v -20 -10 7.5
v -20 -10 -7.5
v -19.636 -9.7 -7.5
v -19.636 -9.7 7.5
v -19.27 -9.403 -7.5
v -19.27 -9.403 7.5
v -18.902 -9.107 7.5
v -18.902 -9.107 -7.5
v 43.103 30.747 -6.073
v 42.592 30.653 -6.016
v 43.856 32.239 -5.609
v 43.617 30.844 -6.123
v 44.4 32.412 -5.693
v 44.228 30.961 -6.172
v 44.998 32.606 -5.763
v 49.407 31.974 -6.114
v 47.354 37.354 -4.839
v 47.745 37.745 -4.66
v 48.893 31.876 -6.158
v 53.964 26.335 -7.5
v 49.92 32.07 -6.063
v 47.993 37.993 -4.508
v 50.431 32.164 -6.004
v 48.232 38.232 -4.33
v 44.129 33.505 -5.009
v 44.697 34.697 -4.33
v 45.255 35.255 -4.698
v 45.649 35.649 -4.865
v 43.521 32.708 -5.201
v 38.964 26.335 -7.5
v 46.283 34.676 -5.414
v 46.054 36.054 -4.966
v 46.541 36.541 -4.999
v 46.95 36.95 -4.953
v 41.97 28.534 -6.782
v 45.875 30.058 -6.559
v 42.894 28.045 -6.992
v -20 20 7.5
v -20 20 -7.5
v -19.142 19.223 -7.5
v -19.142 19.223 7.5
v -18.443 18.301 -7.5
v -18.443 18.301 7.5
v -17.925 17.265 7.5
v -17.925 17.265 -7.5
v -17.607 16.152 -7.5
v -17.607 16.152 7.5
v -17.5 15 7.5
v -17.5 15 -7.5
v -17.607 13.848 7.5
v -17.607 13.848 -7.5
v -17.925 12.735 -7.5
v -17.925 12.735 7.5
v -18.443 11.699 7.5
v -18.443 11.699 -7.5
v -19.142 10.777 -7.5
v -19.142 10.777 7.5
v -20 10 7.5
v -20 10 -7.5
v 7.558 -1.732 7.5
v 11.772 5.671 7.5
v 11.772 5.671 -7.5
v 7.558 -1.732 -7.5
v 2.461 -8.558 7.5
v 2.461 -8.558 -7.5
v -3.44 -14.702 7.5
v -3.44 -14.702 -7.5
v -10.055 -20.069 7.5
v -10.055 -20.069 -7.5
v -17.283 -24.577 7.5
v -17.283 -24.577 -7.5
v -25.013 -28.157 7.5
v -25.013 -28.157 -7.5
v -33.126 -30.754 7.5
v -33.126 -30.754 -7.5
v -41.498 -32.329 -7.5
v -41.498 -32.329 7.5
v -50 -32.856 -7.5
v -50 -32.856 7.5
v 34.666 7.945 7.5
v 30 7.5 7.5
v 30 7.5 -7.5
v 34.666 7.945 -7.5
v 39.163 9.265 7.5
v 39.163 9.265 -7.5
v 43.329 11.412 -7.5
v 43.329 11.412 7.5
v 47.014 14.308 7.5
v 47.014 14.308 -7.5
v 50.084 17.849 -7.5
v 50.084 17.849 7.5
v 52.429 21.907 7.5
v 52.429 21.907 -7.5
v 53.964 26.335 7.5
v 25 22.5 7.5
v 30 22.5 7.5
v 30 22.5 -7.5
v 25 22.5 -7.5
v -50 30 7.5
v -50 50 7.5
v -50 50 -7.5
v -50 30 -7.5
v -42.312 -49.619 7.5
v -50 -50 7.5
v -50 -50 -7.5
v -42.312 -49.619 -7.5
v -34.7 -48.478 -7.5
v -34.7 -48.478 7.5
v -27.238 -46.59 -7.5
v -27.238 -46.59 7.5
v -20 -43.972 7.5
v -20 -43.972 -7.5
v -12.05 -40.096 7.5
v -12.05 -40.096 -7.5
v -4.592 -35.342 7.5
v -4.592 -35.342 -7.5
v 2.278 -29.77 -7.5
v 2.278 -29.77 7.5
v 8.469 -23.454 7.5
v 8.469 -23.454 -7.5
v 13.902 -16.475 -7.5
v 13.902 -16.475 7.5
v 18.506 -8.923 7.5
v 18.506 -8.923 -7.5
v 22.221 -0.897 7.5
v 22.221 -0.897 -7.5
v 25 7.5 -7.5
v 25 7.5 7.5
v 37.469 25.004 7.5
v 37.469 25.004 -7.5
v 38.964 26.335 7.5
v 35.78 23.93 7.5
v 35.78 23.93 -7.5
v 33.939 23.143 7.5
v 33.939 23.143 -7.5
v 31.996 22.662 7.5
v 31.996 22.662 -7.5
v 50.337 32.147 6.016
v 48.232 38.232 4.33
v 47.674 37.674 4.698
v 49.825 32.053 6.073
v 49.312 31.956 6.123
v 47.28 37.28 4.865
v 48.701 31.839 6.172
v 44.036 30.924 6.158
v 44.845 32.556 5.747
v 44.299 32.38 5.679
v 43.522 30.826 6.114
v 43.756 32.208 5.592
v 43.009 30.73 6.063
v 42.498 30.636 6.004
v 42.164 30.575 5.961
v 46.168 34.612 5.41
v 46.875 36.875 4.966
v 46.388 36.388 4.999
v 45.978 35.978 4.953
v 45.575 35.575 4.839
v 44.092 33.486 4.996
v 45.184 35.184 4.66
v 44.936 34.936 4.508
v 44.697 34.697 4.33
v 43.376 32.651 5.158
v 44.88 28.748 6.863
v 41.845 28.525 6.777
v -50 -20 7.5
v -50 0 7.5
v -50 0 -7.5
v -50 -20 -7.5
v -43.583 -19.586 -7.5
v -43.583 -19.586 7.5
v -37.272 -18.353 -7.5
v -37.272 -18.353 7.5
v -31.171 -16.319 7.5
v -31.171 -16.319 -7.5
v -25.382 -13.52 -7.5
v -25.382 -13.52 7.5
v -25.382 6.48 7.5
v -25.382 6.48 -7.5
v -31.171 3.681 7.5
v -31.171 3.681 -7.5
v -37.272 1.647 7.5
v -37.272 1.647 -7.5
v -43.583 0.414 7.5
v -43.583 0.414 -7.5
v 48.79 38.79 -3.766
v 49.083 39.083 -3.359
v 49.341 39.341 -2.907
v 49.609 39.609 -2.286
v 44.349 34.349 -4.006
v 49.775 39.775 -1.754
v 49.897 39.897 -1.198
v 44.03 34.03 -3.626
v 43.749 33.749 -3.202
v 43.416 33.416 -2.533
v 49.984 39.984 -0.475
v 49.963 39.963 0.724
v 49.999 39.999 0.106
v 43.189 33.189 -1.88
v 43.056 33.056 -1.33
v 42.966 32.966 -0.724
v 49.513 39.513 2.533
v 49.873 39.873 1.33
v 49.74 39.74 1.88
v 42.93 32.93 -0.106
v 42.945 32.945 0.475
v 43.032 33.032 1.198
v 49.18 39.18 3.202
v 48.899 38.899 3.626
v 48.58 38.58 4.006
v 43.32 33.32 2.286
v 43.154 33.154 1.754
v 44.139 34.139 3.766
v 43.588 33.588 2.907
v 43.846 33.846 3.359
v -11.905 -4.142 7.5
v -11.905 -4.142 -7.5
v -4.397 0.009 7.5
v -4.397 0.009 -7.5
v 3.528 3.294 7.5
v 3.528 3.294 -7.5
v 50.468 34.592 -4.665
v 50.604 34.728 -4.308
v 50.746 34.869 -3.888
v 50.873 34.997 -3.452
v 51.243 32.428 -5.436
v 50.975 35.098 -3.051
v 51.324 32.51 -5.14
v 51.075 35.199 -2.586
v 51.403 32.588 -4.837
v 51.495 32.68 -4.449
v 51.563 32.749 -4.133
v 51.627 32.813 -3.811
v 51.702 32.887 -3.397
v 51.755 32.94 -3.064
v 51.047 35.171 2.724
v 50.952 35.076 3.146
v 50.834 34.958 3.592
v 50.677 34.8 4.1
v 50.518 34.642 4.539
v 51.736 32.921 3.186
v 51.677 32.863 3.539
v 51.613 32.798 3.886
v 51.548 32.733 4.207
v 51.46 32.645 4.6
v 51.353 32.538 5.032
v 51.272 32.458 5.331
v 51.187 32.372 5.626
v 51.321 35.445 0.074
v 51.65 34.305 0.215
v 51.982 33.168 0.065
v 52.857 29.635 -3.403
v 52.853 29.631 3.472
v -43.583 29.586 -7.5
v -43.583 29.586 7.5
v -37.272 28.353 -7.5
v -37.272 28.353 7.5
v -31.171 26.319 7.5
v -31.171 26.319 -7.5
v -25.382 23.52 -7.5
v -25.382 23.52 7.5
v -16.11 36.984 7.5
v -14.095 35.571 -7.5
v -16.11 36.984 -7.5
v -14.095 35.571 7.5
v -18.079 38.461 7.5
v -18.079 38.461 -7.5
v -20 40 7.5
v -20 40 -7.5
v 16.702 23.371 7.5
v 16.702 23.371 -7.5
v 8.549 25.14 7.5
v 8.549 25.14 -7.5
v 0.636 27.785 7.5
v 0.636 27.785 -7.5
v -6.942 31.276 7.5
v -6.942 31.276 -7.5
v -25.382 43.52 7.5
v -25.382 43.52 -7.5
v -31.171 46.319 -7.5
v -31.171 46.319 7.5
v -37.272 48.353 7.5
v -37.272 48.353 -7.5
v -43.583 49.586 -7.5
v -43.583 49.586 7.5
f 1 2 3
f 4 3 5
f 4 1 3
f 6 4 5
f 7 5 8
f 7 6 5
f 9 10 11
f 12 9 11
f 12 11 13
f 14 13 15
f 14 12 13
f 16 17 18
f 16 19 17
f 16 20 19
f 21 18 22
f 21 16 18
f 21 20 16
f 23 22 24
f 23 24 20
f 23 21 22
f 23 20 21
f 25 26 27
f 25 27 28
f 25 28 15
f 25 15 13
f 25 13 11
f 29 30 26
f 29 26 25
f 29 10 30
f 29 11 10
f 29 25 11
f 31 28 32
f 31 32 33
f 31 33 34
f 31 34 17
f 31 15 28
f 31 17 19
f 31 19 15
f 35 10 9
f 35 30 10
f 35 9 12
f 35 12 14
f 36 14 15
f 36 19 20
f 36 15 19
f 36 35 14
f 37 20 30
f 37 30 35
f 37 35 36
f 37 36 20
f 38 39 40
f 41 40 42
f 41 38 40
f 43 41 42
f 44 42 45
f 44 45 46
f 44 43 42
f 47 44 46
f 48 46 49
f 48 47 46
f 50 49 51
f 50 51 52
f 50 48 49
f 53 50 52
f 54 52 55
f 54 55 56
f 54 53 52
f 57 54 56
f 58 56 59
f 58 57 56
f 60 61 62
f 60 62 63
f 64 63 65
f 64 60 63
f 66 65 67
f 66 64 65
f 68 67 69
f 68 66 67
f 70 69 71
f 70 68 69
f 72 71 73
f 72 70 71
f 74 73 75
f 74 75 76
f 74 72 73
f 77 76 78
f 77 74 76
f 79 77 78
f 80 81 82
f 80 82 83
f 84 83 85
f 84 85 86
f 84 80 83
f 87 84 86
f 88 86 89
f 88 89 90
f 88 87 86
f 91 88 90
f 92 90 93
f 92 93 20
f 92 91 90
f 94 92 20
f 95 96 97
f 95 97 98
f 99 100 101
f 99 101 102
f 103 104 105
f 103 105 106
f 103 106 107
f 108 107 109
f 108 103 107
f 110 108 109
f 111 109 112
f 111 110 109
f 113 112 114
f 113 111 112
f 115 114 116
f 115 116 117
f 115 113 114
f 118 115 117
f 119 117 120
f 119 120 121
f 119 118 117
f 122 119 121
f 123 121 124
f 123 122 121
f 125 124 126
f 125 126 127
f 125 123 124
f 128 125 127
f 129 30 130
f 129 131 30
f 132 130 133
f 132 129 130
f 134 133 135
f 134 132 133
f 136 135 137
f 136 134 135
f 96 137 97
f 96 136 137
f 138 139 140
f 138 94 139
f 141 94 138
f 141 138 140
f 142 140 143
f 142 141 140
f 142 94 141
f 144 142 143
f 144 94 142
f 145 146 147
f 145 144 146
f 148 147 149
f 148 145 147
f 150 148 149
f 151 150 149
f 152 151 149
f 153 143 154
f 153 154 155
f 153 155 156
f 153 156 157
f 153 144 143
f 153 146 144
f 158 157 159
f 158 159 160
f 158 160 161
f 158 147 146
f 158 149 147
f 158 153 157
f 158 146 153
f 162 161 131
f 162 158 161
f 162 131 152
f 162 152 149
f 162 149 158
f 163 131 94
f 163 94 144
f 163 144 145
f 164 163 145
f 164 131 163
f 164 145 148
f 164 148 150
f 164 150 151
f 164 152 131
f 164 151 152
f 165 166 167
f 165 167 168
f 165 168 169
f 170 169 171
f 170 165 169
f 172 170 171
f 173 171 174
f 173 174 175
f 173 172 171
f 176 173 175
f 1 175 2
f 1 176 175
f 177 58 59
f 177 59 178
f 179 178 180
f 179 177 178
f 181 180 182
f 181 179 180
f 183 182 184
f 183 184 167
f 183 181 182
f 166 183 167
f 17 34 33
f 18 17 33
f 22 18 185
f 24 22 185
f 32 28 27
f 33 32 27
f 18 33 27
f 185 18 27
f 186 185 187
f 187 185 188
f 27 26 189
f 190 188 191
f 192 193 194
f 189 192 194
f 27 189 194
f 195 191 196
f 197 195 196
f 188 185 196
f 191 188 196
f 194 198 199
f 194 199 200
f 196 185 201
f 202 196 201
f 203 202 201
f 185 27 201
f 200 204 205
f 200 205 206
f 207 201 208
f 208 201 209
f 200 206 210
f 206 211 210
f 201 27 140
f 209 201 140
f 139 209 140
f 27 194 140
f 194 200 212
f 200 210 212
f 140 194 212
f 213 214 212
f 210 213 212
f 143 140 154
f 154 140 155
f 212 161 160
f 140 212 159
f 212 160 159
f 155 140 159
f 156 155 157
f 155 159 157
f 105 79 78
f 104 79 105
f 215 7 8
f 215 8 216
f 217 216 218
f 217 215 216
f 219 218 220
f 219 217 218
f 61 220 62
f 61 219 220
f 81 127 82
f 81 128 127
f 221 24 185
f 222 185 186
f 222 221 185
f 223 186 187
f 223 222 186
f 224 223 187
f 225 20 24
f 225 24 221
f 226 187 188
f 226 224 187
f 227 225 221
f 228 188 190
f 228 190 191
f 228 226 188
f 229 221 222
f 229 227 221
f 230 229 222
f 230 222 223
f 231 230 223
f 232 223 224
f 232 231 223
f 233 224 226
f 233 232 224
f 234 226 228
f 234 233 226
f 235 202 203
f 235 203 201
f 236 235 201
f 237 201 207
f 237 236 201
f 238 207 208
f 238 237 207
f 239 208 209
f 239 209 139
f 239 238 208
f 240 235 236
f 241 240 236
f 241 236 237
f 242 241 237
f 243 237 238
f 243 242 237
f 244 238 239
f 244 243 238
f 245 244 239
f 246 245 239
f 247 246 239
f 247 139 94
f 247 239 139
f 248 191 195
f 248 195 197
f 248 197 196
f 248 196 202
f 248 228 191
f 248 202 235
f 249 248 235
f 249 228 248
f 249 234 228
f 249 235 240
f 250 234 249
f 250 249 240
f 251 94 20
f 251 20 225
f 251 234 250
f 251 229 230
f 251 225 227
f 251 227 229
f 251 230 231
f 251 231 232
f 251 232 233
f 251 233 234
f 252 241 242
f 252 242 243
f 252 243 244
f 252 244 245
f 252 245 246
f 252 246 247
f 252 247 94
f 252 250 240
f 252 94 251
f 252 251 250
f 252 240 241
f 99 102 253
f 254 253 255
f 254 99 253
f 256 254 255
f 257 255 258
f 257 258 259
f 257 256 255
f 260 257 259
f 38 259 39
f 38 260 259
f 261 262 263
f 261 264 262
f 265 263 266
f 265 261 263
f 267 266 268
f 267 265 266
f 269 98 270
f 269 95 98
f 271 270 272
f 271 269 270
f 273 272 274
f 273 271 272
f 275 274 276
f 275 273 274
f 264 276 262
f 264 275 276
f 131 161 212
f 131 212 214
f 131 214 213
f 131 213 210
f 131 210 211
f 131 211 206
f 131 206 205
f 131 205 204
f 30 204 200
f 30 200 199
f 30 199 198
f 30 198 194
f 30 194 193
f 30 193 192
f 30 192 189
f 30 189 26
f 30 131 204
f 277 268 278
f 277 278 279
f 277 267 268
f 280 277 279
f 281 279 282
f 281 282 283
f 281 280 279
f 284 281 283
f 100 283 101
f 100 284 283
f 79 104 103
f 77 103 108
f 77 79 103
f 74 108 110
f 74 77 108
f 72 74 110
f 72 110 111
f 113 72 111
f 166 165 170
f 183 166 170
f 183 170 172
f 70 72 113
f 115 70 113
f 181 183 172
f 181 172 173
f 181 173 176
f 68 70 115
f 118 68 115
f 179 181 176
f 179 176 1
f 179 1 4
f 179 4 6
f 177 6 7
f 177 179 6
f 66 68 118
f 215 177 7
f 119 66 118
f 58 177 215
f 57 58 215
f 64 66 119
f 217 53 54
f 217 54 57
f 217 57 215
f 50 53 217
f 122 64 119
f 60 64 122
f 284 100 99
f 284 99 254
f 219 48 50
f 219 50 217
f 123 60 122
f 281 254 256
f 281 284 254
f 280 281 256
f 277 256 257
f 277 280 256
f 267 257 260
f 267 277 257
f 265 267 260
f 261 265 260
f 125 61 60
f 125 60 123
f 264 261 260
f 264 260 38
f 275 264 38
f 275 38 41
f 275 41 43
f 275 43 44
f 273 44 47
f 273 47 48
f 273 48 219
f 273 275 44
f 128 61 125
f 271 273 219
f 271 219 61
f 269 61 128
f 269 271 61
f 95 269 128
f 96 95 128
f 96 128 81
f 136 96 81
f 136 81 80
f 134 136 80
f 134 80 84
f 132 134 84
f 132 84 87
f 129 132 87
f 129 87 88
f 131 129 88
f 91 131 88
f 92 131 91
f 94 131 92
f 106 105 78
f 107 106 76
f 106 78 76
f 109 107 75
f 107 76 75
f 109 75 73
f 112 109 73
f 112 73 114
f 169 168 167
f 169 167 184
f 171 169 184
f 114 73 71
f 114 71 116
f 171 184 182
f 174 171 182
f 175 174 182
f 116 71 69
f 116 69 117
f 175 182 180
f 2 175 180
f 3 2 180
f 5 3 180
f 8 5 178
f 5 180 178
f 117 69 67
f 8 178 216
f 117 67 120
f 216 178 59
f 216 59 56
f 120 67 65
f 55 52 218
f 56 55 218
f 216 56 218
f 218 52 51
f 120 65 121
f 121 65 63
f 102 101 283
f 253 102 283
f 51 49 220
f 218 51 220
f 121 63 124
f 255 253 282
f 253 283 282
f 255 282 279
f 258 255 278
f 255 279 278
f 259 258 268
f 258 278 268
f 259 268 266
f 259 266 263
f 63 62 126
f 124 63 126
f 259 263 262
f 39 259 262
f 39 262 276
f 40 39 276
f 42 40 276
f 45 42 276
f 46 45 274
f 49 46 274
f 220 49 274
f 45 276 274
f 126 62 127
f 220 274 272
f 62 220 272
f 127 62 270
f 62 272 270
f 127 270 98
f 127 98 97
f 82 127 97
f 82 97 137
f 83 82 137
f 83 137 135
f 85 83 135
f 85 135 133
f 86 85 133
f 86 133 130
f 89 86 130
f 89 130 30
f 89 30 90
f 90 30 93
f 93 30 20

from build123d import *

# Parameters (mm, degrees)
F17_DEPTH = 7.5
F19_DEPTH = 7.5
F20_DEPTH = 7.5


# Not quite as in the source:
# - the arcs of a loft's sections are written as splines that run evenly, so that the points pair up as in the source's solid


with BuildPart() as f9:
    # F2 (on face) → F9 section 0
    with BuildSketch(Plane(origin=(5, -5, 0), x_dir=(0.7071067812, 0.7071067812, 0), z_dir=(0.7071067812, -0.7071067812, 0))):
        with BuildLine():
            add(Edge.make_bspline(
                [(53.6396103068, 0), (53.6396103068, -0.5817764173), (53.7421679492, -1.1634097103), (54.1401264565, -2.2567917229), (54.4354294185, -2.7682714568), (55.1833467639, -3.6596046401), (55.6357771501, -4.0392388103), (56.1396103068, -4.3301270189)],
                knots=[0, 0, 0, 0, 0.3333333333, 0.3333333333, 0.6666666667, 0.6666666667, 1, 1, 1, 1], degree=3))
            add(Edge.make_bspline(
                [(56.1396103068, -4.3301270189), (56.6434434635, -4.6210152276), (57.1984314921, -4.8230143504), (58.3443073448, -5.0250631797), (58.9349132688, -5.0250631797), (60.0807891214, -4.8230143504), (60.6357771501, -4.6210152276), (61.1396103068, -4.3301270189)],
                knots=[0, 0, 0, 0, 0.3333333333, 0.3333333333, 0.6666666667, 0.6666666667, 1, 1, 1, 1], degree=3))
            add(Edge.make_bspline(
                [(61.1396103068, -4.3301270189), (61.6434434635, -4.0392388103), (62.0958738497, -3.6596046401), (62.8437911951, -2.7682714568), (63.1390941571, -2.2567917229), (63.5370526644, -1.1634097103), (63.6396103068, -0.5817764173), (63.6396103068, 0)],
                knots=[0, 0, 0, 0, 0.3333333333, 0.3333333333, 0.6666666667, 0.6666666667, 1, 1, 1, 1], degree=3))
            add(Edge.make_bspline(
                [(63.6396103068, 0), (63.6396103068, 0.5817764173), (63.5370526644, 1.1634097103), (63.1390941571, 2.2567917229), (62.8437911951, 2.7682714568), (62.0958738497, 3.6596046401), (61.6434434635, 4.0392388103), (61.1396103068, 4.3301270189)],
                knots=[0, 0, 0, 0, 0.3333333333, 0.3333333333, 0.6666666667, 0.6666666667, 1, 1, 1, 1], degree=3))
            add(Edge.make_bspline(
                [(61.1396103068, 4.3301270189), (60.6357771501, 4.6210152276), (60.0807891214, 4.8230143504), (58.9349132688, 5.0250631797), (58.3443073448, 5.0250631797), (57.1984314921, 4.8230143504), (56.6434434635, 4.6210152276), (56.1396103068, 4.3301270189)],
                knots=[0, 0, 0, 0, 0.3333333333, 0.3333333333, 0.6666666667, 0.6666666667, 1, 1, 1, 1], degree=3))
            add(Edge.make_bspline(
                [(56.1396103068, 4.3301270189), (55.6357771501, 4.0392388103), (55.1833467639, 3.6596046401), (54.4354294185, 2.7682714568), (54.1401264565, 2.2567917229), (53.7421679492, 1.1634097103), (53.6396103068, 0.5817764173), (53.6396103068, 0)],
                knots=[0, 0, 0, 0, 0.3333333333, 0.3333333333, 0.6666666667, 0.6666666667, 1, 1, 1, 1], degree=3))
        make_face()
    # F8 (on plane+point) → F9 section 1
    with BuildSketch(Plane.XZ.offset(-26.335299015)):
        Polygon((38.9644660941, 7.5), (38.9644660941, 0), (38.9644660941, -7.5), (53.9644660941, -7.5), (53.9644660941, 0), (53.9644660941, 7.5), align=None)
    loft(ruled=True)

    # F16 (on plane+point) → F17 (join, symmetric)
    with BuildSketch(Plane.XY):
        with BuildLine():
            ThreePointArc((38.9644660941, 26.335299015), (34.8752223254, 23.4990929499), (30, 22.5))
            Line((30, 22.5), (30, 7.5))
            ThreePointArc((30, 7.5), (45.2402766064, 12.7723861725), (53.9644660941, 26.335299015))
            Line((53.9644660941, 26.335299015), (38.9644660941, 26.335299015))
        make_face()
    extrude(amount=F17_DEPTH, both=True)

    # F18 (on Top) → F19 (join, symmetric)
    with BuildSketch(Plane.XY):
        Polygon((30, 7.5), (30, 22.5), (25, 22.5), (25, 15), (25, 7.5), align=None)
    extrude(amount=F19_DEPTH, both=True)

    # F18 (on Top) → F20 (join, symmetric)
    with BuildSketch(Plane.XY):
        with BuildLine():
            Line((-50, 40), (-20, 40))
            ThreePointArc((-20, 40), (-34.1886116992, 47.4341649025), (-50, 50))
            Line((-50, 50), (-50, 40))
        make_face()
        with BuildLine():
            Line((25, 15), (25, 22.5))
            ThreePointArc((25, 22.5), (4.5562384252, 26.3545057073), (-14.0947561264, 35.5710670948))
            ThreePointArc((-14.0947561264, 35.5710670948), (-17.1007926042, 37.7143141594), (-20, 40))
            Line((-20, 40), (-50, 40))
            Line((-50, 40), (-50, 30))
            ThreePointArc((-50, 30), (-34.1886116992, 27.4341649025), (-20, 20))
            ThreePointArc((-20, 20), (-18.1598300563, 17.7950849719), (-17.5, 15))
            Line((-17.5, 15), (10, 15))
            Line((10, 15), (25, 15))
        make_face()
        with BuildLine():
            ThreePointArc((-20, -43.971782705), (8.4686762609, -23.4540986425), (25, 7.5))
            ThreePointArc((25, 7.5), (18.3458720417, 6.87456335), (11.7716580953, 5.6711096222))
            ThreePointArc((11.7716580953, 5.6711096222), (-13.5991721952, -22.4348243888), (-50, -32.8560667038))
            Line((-50, -32.8560667038), (-50, -42.8560667038))
            Line((-50, -42.8560667038), (-50, -50))
            ThreePointArc((-50, -50), (-34.7001682709, -48.4780326329), (-20, -43.971782705))
        make_face()
        with BuildLine():
            Line((25, 7.5), (25, 15))
            Line((25, 15), (10, 15))
            Line((10, 15), (11.7716580953, 5.6711096222))
            ThreePointArc((11.7716580953, 5.6711096222), (18.3458720417, 6.87456335), (25, 7.5))
        make_face()
        with BuildLine():
            Line((11.7716580953, 5.6711096222), (10, 15))
            Line((10, 15), (-17.5, 15))
            ThreePointArc((-17.5, 15), (-18.1598300563, 12.2049150281), (-20, 10))
            ThreePointArc((-20, 10), (-34.1886116992, 2.5658350975), (-50, 0))
            Line((-50, 0), (-50, -20))
            ThreePointArc((-50, -20), (-34.1886116992, -17.4341649025), (-20, -10))
            ThreePointArc((-20, -10), (-19.4528820076, -9.5510950315), (-18.9016373284, -9.1072672811))
            ThreePointArc((-18.9016373284, -9.1072672811), (-4.3970359749, 0.0088769739), (11.7716580953, 5.6711096222))
        make_face()
    extrude(amount=F20_DEPTH, both=True)


solid = f9.part
